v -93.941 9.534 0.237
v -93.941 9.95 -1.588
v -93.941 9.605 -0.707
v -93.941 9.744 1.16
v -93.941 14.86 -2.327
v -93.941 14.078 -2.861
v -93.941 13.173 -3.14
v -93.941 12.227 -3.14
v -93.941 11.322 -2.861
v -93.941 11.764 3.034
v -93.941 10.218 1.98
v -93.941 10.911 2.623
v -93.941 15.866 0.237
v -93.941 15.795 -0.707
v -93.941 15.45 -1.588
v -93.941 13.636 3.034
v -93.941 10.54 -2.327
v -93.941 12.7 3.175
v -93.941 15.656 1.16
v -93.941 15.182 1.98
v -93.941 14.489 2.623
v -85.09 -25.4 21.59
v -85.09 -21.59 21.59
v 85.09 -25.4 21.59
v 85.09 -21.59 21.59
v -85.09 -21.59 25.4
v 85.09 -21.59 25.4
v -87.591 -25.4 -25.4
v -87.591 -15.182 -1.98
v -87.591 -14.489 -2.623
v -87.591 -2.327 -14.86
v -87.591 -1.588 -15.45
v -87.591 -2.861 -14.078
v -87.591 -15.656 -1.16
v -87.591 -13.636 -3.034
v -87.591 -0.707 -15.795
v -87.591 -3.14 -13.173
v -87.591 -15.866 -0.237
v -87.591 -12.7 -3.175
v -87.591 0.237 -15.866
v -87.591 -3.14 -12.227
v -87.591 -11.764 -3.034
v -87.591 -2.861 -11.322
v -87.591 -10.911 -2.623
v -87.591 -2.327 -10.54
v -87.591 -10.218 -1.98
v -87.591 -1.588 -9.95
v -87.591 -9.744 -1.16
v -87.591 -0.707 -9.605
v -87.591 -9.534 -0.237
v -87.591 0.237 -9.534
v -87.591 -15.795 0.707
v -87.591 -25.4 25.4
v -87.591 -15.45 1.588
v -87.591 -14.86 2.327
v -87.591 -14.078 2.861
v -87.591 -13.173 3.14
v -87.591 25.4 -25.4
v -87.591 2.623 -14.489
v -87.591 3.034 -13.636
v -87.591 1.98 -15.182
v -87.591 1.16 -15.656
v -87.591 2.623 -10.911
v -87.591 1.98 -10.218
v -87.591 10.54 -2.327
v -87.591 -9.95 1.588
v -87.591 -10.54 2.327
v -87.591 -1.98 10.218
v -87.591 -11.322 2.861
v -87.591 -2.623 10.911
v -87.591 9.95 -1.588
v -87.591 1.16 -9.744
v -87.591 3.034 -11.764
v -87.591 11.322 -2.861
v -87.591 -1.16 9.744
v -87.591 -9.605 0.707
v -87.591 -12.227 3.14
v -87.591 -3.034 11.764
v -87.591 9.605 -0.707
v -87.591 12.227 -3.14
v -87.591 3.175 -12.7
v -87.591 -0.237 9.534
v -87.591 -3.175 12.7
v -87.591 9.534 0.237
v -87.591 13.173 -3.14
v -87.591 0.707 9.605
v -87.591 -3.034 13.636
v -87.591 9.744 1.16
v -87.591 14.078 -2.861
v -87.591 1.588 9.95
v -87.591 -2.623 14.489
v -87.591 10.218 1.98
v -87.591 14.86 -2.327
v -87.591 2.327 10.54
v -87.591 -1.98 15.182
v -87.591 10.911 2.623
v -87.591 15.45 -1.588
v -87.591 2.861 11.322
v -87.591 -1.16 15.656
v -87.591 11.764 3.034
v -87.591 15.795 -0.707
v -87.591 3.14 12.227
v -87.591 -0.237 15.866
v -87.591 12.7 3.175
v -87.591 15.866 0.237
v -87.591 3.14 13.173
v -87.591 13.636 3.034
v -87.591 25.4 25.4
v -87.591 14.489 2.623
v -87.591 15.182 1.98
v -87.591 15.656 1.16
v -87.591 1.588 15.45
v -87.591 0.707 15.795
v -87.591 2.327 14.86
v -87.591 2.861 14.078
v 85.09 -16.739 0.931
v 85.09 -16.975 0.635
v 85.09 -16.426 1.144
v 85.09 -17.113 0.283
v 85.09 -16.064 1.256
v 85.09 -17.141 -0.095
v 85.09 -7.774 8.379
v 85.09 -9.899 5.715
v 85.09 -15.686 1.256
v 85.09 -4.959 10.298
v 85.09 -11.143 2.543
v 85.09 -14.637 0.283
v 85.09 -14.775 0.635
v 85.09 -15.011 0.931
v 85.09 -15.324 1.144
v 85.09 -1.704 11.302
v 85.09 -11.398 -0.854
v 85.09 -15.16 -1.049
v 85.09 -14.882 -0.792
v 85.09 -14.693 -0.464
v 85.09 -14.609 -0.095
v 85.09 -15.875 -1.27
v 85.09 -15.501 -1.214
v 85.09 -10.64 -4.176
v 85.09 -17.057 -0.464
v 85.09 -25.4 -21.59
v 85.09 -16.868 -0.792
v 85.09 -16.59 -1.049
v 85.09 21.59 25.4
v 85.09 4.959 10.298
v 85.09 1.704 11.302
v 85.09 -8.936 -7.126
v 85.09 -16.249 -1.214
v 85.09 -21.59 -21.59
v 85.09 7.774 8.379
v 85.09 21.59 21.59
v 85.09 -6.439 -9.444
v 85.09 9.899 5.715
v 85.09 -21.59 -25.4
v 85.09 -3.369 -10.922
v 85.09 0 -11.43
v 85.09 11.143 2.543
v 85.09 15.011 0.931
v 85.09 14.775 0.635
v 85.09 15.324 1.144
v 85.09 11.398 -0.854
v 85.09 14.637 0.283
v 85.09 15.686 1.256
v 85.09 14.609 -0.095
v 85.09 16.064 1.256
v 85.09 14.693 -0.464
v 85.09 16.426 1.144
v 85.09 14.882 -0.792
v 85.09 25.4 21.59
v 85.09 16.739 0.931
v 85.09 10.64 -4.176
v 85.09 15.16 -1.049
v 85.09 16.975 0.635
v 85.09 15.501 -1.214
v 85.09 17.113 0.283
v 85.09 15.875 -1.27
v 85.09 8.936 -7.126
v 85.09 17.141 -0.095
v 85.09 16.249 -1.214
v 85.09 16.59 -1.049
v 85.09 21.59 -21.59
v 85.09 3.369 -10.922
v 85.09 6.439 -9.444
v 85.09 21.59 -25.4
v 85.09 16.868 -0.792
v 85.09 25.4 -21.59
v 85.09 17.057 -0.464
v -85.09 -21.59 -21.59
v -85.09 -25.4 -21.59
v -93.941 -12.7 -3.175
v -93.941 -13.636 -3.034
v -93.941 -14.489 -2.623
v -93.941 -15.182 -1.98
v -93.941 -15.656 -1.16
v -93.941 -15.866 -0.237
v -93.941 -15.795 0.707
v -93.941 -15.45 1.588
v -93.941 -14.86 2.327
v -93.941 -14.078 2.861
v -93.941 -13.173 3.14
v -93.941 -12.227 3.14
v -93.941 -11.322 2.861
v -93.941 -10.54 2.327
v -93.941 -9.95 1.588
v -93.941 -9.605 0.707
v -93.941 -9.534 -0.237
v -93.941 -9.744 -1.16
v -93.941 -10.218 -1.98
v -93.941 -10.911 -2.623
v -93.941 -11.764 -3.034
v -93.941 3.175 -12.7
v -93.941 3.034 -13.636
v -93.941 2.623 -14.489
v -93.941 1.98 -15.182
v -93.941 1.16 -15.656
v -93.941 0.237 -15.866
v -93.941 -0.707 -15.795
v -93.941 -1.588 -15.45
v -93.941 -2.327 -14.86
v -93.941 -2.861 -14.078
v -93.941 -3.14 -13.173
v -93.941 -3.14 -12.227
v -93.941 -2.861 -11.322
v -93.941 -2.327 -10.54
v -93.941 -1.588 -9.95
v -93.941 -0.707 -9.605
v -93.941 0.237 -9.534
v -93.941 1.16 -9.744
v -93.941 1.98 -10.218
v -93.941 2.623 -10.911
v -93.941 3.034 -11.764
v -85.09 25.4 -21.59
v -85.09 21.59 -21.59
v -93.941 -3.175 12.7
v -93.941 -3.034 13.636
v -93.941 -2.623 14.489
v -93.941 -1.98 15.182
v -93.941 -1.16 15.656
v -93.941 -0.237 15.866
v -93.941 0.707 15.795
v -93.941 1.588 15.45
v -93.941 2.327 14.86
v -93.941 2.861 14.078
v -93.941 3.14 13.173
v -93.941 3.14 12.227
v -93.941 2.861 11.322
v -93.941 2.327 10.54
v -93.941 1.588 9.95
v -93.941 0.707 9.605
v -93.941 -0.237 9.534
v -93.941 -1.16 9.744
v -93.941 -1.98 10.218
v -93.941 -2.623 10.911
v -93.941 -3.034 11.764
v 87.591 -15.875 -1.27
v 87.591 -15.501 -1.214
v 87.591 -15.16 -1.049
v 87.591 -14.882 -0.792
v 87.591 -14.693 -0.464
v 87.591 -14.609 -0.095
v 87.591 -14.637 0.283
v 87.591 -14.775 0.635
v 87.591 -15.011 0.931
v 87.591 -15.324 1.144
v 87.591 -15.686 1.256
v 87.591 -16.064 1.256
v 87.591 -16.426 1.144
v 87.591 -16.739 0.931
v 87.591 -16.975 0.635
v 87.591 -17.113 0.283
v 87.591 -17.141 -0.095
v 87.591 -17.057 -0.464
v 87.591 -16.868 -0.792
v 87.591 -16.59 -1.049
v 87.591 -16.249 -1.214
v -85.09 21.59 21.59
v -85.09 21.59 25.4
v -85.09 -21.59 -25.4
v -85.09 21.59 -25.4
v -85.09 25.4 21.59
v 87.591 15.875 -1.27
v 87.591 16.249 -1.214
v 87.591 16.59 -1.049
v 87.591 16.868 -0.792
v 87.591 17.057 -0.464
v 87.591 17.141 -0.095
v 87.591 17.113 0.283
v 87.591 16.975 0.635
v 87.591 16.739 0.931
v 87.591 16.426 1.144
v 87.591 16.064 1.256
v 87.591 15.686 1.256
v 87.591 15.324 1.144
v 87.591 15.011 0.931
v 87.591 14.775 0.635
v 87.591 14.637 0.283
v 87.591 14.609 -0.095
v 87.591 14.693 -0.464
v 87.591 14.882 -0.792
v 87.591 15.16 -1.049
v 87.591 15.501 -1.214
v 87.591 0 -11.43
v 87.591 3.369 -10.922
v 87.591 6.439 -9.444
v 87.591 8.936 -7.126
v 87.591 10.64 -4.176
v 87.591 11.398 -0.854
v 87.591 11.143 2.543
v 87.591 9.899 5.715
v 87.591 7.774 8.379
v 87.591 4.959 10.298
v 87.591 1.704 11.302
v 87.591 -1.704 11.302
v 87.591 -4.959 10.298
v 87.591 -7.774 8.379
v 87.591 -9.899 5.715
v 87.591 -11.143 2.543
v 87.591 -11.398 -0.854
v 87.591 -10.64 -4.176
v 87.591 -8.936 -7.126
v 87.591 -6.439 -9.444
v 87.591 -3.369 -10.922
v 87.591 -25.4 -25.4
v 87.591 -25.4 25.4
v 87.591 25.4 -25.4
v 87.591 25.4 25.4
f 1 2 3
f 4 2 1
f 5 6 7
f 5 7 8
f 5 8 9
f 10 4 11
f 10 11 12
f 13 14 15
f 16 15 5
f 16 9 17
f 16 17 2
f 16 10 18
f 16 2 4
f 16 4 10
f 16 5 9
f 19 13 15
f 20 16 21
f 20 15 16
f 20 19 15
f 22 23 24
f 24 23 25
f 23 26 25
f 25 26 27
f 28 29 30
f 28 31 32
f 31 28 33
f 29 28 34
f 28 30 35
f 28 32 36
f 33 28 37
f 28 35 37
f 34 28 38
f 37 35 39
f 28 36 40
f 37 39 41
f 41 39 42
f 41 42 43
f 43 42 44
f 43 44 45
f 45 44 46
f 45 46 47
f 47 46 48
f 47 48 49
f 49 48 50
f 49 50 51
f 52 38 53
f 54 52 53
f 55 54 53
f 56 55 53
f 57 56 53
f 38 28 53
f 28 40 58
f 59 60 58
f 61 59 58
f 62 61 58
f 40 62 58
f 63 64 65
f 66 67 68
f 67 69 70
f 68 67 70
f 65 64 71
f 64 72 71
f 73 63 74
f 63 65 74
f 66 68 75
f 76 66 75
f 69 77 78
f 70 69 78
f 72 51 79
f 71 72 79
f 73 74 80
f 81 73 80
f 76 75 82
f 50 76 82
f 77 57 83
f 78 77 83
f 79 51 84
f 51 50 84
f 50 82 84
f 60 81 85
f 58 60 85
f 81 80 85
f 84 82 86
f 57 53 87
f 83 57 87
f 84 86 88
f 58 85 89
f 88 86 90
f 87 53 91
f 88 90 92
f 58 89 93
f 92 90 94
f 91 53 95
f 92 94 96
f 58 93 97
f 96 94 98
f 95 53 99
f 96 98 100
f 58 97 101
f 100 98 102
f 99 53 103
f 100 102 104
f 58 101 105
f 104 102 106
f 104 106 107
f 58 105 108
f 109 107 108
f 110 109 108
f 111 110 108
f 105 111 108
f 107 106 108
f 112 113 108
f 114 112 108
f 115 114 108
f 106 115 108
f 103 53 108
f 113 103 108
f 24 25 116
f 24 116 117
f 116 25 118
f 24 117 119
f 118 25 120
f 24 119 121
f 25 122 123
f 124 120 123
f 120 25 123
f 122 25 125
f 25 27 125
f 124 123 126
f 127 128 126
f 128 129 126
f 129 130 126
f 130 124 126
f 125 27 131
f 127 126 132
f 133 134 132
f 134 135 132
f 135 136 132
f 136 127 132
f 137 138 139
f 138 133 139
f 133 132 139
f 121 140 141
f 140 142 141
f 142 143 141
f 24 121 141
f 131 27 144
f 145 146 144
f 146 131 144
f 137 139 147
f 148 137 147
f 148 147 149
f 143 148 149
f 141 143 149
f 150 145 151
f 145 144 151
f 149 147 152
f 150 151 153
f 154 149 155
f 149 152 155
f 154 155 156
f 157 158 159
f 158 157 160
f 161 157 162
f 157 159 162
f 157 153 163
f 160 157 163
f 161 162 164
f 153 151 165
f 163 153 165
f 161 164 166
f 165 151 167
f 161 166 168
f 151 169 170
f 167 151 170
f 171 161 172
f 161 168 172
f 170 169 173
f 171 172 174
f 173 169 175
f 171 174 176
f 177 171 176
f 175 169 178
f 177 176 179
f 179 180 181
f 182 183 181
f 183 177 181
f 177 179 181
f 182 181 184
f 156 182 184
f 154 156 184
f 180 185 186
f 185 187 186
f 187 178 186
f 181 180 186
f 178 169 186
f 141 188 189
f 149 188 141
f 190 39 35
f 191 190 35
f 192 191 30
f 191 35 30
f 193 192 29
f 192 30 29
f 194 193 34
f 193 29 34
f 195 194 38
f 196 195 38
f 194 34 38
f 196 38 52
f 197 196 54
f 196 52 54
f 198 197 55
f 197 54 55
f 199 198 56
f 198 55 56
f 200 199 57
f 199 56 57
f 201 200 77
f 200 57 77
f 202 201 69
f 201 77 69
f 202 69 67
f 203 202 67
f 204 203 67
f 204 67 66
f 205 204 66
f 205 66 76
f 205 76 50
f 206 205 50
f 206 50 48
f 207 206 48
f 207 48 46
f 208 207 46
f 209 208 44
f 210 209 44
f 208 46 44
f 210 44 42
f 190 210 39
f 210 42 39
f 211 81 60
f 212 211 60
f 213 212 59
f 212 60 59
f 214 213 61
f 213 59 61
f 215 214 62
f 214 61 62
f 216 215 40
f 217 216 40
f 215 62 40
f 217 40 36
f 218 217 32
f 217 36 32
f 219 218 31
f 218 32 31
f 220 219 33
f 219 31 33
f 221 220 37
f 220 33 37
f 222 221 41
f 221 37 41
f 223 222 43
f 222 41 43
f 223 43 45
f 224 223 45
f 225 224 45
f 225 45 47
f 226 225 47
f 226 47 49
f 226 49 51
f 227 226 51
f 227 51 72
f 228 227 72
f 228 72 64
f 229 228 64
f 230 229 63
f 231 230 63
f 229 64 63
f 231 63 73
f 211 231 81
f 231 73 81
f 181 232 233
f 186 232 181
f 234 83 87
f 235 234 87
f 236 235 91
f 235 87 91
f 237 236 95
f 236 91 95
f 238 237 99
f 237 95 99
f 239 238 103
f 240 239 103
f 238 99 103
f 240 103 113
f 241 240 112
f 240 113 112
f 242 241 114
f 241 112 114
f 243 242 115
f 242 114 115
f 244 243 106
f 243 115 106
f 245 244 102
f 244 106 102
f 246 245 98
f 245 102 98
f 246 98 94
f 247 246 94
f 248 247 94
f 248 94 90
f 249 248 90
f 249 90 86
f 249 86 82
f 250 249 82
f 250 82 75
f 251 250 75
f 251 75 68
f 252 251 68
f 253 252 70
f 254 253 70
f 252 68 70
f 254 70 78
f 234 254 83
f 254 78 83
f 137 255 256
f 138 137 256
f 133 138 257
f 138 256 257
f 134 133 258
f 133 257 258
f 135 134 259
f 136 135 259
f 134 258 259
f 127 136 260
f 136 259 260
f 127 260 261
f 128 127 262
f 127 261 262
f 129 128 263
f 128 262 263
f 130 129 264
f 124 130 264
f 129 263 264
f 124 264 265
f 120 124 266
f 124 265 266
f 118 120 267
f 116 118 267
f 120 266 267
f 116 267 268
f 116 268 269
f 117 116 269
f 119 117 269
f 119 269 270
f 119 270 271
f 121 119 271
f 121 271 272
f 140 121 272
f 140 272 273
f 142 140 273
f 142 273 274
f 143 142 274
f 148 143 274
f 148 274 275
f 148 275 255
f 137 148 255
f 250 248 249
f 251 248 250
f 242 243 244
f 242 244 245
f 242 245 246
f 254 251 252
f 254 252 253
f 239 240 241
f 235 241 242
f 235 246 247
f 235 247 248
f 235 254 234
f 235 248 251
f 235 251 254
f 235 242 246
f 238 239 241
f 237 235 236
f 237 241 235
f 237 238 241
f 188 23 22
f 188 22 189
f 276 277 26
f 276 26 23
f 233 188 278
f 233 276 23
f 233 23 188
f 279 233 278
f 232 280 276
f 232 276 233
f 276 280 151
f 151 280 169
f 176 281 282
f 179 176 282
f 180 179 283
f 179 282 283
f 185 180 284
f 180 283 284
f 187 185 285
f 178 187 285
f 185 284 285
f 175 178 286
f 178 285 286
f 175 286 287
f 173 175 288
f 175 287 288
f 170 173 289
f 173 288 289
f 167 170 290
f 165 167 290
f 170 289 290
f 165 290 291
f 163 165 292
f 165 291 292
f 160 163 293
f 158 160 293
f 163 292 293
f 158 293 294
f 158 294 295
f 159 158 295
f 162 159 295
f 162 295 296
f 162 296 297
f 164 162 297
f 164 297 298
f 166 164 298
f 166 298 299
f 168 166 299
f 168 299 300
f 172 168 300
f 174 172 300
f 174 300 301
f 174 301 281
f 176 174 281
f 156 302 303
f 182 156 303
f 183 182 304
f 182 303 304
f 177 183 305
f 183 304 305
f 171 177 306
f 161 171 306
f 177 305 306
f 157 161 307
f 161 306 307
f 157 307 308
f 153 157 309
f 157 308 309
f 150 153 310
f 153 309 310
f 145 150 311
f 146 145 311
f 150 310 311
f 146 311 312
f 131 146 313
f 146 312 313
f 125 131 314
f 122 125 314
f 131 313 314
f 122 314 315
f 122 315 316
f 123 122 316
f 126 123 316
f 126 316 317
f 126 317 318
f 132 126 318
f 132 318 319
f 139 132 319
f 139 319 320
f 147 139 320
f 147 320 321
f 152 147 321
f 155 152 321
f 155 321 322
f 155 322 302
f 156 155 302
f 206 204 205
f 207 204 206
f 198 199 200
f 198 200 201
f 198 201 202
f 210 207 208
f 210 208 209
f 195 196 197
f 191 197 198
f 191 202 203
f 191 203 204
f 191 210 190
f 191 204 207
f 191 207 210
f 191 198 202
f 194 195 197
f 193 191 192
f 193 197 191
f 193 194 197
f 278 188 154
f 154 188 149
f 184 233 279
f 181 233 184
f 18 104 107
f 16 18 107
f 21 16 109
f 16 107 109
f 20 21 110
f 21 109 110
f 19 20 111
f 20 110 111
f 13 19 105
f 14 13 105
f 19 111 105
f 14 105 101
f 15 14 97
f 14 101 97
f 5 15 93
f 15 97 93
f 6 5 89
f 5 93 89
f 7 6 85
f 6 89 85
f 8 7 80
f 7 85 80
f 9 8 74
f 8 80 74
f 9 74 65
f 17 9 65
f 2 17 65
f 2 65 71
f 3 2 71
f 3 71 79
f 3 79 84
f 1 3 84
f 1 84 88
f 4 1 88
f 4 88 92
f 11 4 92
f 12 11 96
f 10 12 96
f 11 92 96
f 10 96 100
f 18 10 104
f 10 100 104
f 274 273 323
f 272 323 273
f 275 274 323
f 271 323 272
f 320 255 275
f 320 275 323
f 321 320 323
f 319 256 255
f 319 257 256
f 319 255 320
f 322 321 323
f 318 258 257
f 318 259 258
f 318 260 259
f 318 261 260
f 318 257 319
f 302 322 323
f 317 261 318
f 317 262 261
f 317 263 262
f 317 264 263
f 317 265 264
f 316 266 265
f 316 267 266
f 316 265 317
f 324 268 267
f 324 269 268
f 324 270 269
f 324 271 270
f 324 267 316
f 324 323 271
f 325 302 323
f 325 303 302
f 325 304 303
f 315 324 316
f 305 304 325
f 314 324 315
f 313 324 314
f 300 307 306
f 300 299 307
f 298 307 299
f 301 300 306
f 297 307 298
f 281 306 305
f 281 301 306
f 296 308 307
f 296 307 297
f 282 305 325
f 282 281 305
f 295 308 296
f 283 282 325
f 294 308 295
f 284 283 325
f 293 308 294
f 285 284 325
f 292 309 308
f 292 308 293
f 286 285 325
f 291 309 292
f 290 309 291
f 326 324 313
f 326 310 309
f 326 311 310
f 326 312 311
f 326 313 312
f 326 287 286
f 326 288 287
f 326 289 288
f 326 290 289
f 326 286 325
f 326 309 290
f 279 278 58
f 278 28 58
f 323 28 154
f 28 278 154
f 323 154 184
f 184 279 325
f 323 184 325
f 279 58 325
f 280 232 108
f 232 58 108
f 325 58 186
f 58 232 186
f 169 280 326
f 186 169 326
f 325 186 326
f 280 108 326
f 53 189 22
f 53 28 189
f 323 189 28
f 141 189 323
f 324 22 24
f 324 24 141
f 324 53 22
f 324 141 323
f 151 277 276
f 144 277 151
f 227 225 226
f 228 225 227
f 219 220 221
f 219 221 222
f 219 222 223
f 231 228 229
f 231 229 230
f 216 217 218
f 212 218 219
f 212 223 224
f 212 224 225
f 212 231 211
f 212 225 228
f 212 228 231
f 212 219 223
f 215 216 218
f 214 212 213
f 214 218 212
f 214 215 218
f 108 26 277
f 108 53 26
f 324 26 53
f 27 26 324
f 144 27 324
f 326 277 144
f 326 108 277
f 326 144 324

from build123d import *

# Parameters (mm, degrees)
SKETCH2_W           = 175.181977678
SKETCH2_H           = 50.8
BOSS_EXTRUDE1_DEPTH = 25.4
SKETCH8_R           = 11.43
SKETCH8_R_2         = 1.27
CUT_EXTRUDE3_DEPTH  = 12.7
SKETCH10_W          = 170.18
SKETCH10_H          = 43.18
CUT_EXTRUDE5_DEPTH  = 51.8
SKETCH11_R          = 3.175
BOSS_EXTRUDE2_DEPTH = 6.35
CIRPATTERN2_COUNT   = 4
CIRPATTERN3_COUNT   = 2
CIRPATTERN3_ANGLE   = 90


with BuildPart() as part:
    # Sketch2 → Boss-Extrude1 (new body, symmetric)
    with BuildSketch(Plane.XY):
        Rectangle(SKETCH2_W, SKETCH2_H)
    extrude(amount=BOSS_EXTRUDE1_DEPTH, both=True)

    # Sketch8 → Cut-Extrude3 (cut)
    with BuildSketch(Plane(origin=(87.590988839, 0, 0), x_dir=(0, 0, -1), z_dir=(1, 0, 0))):
        Circle(SKETCH8_R)
        with Locations((0, 15.875)):
            Circle(SKETCH8_R_2)
        with Locations((0, -15.875)):
            Circle(SKETCH8_R_2)
    extrude(amount=-CUT_EXTRUDE3_DEPTH, mode=Mode.SUBTRACT)

    # Sketch10 → Cut-Extrude5 (cut, through all)
    with BuildSketch(Plane(origin=(0, 25.4, 0), x_dir=(1, 0, 0), z_dir=(0, 1, 0))):
        Rectangle(SKETCH10_W, SKETCH10_H)
    cut_extrude5 = extrude(amount=-CUT_EXTRUDE5_DEPTH, mode=Mode.SUBTRACT)

    # Sketch11 → Boss-Extrude2 (add)
    with BuildSketch(Plane.ZY.offset(87.590988839)):
        with Locations((0, 12.7)):
            Circle(SKETCH11_R)
    boss_extrude2 = extrude(amount=BOSS_EXTRUDE2_DEPTH)

    # CirPattern2: Boss-Extrude2 ×4 about axis
    cirpattern2_axis = Axis((0, 0, 0), (1, 0, 0))
    for i in range(1, CIRPATTERN2_COUNT):
        add(boss_extrude2.rotate(cirpattern2_axis, i * 360 / CIRPATTERN2_COUNT))

    # CirPattern3: Cut-Extrude5 ×2 about axis
    cirpattern3_axis = Axis((74.890988839, 0, 0), (1, 0, 0))
    for i in range(1, CIRPATTERN3_COUNT):
        add(cut_extrude5.rotate(cirpattern3_axis, i * CIRPATTERN3_ANGLE / (CIRPATTERN3_COUNT - 1)), mode=Mode.SUBTRACT)


solid = part.part
